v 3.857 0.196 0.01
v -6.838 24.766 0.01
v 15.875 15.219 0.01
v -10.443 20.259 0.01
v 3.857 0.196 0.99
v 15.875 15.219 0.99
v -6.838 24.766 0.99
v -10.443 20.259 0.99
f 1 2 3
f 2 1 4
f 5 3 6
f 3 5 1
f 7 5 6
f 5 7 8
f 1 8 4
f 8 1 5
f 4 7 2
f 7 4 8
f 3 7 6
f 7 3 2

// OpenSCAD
// Tangent points of two circles
// Sources
// http://www.ambrsoft.com/TrigoCalc/Circles2/Circles2Tangent_.htm
// http://mathworld.wolfram.com/Circle-CircleTangents.html

function sqr(x) = pow(x,2);
function sqrt(x) = pow(x, 1/2);

function getx(c, r, sc, s=1) =	let (cx=c[0], cy=c[1], px=sc[0], py=sc[1]) ((sqr(r)*(px-cx)+(s*r*(py-cy)*sqrt(sqr(px-cx)+sqr(py-cy)-sqr(r)))) /
			(sqr(px-cx)+sqr(py-cy)))
			+cx;

function gety(c, r, sc, s=1) =	let (cx=c[0], cy=c[1], px=sc[0], py=sc[1]) ((sqr(r)*(py-cy)+(s*r*(px-cx)*sqrt(sqr(px-cx)+sqr(py-cy)-sqr(r)))) /
			(sqr(px-cx)+sqr(py-cy)))
			+cy;
			
// Get center of similitude, either internal or external		
// s=-1 for external and 1 for internal
function GetSimCentre (c0, r0, c1, r1, s=-1) = let (a=c0[0], b=c0[1], c=c1[0], d=c1[1]) [(c*r0+s*a*r1)/(r0+s*r1), (d*r0+s*b*r1)/(r0+s*r1)];

// c=centre of circle, r=radius, sc=center of similitude
// s selects which tangent point on circle depending on whether 1 or -1
function GetTangent (c, r, sc, s=1) = [getx(c, r, sc, s), gety(c, r, sc, s=-s)];

// test
$fn = 64;

// Some test circles
c0 = [25, 6];
r0 = 10;
c1 = [5, 22];
r1 = 3;

// Show circles with both internal and etxernal points of similitude
for (whichsc = [-1, 1]) translate ([(r0+r1)*1*whichsc, 0, 0]) {
	// Get center of similitude, either internal or external		
	// s=-1 for external and 1 for internal
	sc = GetSimCentre(c0, r0, c1, r1, s=whichsc); 

	// Points on C0
	t0 = GetTangent(c0, r0, sc, s=1);
	t1 = GetTangent(c0, r0, sc, s=-1);

	// Points on C1
	t2 = GetTangent(c1, r1, sc, s=1);
	t3 = GetTangent(c1, r1, sc, s=-1);

	// Show circles
	linear_extrude (height=1) {
		// translate (c0) circle (r=r0);
		// translate (c1) circle (r=r1);
	}

	/*  Points just for debug
	translate (sc) color ("blue") circle (r=1);
	translate (t0) color ("blue") circle (r=1);
	translate (t1) color ("blue") circle (r=1);
	translate (t2) color ("blue") circle (r=1);
	translate (t3) color ("blue") circle (r=1);
	*/
	
	// Show "fillet" based on point of similitude
	translate ([0, 0, 0.01]) color("red") linear_extrude (height=0.98) polygon ([t0, t2, t3, t1]);
}
